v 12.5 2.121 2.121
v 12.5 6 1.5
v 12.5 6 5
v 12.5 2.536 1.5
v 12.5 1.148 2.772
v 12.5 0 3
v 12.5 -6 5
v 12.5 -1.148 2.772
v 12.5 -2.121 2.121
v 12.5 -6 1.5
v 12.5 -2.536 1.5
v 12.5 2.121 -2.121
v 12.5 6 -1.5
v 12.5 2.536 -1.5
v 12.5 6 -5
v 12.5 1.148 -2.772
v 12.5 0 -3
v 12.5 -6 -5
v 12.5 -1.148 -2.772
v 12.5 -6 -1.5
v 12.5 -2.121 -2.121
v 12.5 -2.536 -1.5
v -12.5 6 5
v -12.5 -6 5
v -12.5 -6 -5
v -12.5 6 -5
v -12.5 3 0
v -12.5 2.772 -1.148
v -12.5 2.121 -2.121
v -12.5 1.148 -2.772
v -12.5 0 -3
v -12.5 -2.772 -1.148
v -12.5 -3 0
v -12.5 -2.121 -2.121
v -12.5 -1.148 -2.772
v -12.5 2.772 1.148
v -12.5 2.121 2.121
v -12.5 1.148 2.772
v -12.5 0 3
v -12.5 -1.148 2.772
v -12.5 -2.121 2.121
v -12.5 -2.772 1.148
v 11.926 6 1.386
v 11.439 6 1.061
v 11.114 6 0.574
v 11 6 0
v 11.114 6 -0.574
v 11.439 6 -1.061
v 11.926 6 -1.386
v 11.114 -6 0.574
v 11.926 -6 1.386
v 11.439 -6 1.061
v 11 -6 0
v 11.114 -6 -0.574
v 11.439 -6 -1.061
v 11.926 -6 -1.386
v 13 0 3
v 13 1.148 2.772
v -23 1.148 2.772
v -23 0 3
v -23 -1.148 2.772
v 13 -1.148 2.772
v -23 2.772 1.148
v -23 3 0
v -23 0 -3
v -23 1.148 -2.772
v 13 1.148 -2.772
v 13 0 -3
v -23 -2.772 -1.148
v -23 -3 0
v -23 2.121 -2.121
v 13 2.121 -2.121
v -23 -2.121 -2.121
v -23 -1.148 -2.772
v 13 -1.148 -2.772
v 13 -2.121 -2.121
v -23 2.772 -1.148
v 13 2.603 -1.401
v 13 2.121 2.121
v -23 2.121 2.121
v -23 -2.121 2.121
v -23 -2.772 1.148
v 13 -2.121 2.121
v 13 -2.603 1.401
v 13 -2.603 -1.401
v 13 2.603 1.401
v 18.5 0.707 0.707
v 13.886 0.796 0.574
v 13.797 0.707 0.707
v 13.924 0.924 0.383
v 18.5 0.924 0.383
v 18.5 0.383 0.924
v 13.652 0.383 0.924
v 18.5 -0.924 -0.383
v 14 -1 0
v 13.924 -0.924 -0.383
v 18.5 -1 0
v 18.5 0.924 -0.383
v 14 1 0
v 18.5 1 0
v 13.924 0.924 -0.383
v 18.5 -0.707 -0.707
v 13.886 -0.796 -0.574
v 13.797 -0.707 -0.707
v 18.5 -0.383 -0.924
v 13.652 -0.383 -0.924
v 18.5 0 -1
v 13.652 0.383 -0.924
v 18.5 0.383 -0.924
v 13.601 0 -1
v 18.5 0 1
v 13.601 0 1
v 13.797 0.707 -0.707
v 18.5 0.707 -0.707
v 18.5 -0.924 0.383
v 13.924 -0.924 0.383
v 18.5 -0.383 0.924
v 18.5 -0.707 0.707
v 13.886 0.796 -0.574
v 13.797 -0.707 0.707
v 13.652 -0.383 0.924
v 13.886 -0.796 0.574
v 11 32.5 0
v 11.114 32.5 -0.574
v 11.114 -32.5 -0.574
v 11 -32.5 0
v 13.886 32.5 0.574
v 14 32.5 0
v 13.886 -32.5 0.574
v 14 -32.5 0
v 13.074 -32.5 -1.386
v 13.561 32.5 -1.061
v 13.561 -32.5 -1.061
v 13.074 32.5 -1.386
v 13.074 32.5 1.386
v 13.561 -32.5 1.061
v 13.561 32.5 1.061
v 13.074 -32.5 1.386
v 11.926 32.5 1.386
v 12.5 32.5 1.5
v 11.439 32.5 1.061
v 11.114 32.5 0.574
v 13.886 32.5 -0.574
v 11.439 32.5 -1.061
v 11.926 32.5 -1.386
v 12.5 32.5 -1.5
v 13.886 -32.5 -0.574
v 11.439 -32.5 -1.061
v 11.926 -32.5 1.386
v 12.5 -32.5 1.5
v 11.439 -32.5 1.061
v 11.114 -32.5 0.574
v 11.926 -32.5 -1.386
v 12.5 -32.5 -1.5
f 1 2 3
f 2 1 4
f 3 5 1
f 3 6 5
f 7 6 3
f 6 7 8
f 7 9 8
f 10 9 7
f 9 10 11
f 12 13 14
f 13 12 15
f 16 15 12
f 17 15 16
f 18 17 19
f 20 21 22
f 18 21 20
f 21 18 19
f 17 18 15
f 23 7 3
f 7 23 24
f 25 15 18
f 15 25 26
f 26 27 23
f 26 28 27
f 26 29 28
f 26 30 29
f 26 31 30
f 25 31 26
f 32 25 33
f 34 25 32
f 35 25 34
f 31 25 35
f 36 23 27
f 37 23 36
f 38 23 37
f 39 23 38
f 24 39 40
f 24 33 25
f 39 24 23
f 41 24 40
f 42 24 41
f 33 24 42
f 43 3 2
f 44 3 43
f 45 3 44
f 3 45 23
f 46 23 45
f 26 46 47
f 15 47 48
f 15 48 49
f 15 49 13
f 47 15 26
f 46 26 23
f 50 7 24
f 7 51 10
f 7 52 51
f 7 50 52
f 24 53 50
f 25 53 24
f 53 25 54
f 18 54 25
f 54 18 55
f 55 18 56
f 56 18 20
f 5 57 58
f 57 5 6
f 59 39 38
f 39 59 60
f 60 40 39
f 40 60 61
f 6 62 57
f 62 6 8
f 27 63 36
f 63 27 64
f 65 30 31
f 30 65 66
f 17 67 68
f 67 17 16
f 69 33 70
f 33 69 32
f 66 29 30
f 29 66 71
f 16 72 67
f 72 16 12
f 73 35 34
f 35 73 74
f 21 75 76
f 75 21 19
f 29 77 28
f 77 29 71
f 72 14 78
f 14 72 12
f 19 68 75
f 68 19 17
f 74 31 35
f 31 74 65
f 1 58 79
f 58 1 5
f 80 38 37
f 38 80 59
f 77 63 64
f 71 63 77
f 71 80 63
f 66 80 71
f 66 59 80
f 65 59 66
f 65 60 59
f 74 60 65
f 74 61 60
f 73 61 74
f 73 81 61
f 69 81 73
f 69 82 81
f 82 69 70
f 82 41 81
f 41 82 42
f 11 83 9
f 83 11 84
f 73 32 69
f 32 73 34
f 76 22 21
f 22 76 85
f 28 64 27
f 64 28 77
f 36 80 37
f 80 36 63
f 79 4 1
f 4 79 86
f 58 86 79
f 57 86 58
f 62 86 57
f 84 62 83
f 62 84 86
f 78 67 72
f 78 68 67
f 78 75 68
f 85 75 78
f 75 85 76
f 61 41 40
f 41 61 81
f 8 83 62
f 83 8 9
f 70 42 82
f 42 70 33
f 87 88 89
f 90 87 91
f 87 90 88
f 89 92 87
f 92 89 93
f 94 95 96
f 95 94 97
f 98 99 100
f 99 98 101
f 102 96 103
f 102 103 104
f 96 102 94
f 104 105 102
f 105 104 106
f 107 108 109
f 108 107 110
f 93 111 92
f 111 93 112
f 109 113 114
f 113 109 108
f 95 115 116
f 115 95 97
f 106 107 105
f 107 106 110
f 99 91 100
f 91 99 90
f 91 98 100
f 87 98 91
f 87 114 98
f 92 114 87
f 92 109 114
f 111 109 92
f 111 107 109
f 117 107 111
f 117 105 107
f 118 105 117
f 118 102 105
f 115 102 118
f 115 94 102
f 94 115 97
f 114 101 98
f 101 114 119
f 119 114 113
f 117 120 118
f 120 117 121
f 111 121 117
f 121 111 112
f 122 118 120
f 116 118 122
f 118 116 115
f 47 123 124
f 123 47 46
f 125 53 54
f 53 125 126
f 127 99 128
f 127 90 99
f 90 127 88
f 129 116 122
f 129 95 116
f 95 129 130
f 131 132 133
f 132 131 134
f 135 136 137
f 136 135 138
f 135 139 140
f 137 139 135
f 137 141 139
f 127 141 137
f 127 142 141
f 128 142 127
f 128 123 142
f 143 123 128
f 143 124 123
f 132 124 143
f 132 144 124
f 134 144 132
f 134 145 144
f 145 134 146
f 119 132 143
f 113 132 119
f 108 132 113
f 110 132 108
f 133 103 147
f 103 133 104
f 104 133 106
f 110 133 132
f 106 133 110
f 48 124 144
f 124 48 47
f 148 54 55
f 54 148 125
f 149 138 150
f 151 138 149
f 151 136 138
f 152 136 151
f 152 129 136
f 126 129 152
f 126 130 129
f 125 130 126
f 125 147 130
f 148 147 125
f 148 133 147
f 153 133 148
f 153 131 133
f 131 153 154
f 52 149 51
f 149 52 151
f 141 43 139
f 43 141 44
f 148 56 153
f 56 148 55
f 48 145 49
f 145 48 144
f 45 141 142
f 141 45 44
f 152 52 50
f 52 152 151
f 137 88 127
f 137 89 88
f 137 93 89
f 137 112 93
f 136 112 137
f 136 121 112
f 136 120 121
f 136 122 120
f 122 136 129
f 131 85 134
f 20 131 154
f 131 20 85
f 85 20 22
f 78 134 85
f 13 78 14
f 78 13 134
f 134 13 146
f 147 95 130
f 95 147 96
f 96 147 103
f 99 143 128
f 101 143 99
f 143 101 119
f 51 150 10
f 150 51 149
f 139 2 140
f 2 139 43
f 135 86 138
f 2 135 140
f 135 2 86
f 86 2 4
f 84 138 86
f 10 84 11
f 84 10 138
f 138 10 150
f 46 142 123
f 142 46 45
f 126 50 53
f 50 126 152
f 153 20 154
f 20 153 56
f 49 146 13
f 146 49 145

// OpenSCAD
module gearmotor(l=25, w=12, h=10, r=3
){
	cube([l,w,h], center=true);
	translate([-5,0,0]) rotate([0,90,0])
		cylinder(r=r, h=l+10+1, center=true, $fn=16);
	translate([l/2,0,0]) rotate([0,90,0])
		cylinder(r=1, h=w, center=true, $fn=16);
	translate([l/2,0,0]) rotate([90,0,0])
		cylinder(r=1.5, h=65, center=true, $fn=16);

}

gearmotor();
